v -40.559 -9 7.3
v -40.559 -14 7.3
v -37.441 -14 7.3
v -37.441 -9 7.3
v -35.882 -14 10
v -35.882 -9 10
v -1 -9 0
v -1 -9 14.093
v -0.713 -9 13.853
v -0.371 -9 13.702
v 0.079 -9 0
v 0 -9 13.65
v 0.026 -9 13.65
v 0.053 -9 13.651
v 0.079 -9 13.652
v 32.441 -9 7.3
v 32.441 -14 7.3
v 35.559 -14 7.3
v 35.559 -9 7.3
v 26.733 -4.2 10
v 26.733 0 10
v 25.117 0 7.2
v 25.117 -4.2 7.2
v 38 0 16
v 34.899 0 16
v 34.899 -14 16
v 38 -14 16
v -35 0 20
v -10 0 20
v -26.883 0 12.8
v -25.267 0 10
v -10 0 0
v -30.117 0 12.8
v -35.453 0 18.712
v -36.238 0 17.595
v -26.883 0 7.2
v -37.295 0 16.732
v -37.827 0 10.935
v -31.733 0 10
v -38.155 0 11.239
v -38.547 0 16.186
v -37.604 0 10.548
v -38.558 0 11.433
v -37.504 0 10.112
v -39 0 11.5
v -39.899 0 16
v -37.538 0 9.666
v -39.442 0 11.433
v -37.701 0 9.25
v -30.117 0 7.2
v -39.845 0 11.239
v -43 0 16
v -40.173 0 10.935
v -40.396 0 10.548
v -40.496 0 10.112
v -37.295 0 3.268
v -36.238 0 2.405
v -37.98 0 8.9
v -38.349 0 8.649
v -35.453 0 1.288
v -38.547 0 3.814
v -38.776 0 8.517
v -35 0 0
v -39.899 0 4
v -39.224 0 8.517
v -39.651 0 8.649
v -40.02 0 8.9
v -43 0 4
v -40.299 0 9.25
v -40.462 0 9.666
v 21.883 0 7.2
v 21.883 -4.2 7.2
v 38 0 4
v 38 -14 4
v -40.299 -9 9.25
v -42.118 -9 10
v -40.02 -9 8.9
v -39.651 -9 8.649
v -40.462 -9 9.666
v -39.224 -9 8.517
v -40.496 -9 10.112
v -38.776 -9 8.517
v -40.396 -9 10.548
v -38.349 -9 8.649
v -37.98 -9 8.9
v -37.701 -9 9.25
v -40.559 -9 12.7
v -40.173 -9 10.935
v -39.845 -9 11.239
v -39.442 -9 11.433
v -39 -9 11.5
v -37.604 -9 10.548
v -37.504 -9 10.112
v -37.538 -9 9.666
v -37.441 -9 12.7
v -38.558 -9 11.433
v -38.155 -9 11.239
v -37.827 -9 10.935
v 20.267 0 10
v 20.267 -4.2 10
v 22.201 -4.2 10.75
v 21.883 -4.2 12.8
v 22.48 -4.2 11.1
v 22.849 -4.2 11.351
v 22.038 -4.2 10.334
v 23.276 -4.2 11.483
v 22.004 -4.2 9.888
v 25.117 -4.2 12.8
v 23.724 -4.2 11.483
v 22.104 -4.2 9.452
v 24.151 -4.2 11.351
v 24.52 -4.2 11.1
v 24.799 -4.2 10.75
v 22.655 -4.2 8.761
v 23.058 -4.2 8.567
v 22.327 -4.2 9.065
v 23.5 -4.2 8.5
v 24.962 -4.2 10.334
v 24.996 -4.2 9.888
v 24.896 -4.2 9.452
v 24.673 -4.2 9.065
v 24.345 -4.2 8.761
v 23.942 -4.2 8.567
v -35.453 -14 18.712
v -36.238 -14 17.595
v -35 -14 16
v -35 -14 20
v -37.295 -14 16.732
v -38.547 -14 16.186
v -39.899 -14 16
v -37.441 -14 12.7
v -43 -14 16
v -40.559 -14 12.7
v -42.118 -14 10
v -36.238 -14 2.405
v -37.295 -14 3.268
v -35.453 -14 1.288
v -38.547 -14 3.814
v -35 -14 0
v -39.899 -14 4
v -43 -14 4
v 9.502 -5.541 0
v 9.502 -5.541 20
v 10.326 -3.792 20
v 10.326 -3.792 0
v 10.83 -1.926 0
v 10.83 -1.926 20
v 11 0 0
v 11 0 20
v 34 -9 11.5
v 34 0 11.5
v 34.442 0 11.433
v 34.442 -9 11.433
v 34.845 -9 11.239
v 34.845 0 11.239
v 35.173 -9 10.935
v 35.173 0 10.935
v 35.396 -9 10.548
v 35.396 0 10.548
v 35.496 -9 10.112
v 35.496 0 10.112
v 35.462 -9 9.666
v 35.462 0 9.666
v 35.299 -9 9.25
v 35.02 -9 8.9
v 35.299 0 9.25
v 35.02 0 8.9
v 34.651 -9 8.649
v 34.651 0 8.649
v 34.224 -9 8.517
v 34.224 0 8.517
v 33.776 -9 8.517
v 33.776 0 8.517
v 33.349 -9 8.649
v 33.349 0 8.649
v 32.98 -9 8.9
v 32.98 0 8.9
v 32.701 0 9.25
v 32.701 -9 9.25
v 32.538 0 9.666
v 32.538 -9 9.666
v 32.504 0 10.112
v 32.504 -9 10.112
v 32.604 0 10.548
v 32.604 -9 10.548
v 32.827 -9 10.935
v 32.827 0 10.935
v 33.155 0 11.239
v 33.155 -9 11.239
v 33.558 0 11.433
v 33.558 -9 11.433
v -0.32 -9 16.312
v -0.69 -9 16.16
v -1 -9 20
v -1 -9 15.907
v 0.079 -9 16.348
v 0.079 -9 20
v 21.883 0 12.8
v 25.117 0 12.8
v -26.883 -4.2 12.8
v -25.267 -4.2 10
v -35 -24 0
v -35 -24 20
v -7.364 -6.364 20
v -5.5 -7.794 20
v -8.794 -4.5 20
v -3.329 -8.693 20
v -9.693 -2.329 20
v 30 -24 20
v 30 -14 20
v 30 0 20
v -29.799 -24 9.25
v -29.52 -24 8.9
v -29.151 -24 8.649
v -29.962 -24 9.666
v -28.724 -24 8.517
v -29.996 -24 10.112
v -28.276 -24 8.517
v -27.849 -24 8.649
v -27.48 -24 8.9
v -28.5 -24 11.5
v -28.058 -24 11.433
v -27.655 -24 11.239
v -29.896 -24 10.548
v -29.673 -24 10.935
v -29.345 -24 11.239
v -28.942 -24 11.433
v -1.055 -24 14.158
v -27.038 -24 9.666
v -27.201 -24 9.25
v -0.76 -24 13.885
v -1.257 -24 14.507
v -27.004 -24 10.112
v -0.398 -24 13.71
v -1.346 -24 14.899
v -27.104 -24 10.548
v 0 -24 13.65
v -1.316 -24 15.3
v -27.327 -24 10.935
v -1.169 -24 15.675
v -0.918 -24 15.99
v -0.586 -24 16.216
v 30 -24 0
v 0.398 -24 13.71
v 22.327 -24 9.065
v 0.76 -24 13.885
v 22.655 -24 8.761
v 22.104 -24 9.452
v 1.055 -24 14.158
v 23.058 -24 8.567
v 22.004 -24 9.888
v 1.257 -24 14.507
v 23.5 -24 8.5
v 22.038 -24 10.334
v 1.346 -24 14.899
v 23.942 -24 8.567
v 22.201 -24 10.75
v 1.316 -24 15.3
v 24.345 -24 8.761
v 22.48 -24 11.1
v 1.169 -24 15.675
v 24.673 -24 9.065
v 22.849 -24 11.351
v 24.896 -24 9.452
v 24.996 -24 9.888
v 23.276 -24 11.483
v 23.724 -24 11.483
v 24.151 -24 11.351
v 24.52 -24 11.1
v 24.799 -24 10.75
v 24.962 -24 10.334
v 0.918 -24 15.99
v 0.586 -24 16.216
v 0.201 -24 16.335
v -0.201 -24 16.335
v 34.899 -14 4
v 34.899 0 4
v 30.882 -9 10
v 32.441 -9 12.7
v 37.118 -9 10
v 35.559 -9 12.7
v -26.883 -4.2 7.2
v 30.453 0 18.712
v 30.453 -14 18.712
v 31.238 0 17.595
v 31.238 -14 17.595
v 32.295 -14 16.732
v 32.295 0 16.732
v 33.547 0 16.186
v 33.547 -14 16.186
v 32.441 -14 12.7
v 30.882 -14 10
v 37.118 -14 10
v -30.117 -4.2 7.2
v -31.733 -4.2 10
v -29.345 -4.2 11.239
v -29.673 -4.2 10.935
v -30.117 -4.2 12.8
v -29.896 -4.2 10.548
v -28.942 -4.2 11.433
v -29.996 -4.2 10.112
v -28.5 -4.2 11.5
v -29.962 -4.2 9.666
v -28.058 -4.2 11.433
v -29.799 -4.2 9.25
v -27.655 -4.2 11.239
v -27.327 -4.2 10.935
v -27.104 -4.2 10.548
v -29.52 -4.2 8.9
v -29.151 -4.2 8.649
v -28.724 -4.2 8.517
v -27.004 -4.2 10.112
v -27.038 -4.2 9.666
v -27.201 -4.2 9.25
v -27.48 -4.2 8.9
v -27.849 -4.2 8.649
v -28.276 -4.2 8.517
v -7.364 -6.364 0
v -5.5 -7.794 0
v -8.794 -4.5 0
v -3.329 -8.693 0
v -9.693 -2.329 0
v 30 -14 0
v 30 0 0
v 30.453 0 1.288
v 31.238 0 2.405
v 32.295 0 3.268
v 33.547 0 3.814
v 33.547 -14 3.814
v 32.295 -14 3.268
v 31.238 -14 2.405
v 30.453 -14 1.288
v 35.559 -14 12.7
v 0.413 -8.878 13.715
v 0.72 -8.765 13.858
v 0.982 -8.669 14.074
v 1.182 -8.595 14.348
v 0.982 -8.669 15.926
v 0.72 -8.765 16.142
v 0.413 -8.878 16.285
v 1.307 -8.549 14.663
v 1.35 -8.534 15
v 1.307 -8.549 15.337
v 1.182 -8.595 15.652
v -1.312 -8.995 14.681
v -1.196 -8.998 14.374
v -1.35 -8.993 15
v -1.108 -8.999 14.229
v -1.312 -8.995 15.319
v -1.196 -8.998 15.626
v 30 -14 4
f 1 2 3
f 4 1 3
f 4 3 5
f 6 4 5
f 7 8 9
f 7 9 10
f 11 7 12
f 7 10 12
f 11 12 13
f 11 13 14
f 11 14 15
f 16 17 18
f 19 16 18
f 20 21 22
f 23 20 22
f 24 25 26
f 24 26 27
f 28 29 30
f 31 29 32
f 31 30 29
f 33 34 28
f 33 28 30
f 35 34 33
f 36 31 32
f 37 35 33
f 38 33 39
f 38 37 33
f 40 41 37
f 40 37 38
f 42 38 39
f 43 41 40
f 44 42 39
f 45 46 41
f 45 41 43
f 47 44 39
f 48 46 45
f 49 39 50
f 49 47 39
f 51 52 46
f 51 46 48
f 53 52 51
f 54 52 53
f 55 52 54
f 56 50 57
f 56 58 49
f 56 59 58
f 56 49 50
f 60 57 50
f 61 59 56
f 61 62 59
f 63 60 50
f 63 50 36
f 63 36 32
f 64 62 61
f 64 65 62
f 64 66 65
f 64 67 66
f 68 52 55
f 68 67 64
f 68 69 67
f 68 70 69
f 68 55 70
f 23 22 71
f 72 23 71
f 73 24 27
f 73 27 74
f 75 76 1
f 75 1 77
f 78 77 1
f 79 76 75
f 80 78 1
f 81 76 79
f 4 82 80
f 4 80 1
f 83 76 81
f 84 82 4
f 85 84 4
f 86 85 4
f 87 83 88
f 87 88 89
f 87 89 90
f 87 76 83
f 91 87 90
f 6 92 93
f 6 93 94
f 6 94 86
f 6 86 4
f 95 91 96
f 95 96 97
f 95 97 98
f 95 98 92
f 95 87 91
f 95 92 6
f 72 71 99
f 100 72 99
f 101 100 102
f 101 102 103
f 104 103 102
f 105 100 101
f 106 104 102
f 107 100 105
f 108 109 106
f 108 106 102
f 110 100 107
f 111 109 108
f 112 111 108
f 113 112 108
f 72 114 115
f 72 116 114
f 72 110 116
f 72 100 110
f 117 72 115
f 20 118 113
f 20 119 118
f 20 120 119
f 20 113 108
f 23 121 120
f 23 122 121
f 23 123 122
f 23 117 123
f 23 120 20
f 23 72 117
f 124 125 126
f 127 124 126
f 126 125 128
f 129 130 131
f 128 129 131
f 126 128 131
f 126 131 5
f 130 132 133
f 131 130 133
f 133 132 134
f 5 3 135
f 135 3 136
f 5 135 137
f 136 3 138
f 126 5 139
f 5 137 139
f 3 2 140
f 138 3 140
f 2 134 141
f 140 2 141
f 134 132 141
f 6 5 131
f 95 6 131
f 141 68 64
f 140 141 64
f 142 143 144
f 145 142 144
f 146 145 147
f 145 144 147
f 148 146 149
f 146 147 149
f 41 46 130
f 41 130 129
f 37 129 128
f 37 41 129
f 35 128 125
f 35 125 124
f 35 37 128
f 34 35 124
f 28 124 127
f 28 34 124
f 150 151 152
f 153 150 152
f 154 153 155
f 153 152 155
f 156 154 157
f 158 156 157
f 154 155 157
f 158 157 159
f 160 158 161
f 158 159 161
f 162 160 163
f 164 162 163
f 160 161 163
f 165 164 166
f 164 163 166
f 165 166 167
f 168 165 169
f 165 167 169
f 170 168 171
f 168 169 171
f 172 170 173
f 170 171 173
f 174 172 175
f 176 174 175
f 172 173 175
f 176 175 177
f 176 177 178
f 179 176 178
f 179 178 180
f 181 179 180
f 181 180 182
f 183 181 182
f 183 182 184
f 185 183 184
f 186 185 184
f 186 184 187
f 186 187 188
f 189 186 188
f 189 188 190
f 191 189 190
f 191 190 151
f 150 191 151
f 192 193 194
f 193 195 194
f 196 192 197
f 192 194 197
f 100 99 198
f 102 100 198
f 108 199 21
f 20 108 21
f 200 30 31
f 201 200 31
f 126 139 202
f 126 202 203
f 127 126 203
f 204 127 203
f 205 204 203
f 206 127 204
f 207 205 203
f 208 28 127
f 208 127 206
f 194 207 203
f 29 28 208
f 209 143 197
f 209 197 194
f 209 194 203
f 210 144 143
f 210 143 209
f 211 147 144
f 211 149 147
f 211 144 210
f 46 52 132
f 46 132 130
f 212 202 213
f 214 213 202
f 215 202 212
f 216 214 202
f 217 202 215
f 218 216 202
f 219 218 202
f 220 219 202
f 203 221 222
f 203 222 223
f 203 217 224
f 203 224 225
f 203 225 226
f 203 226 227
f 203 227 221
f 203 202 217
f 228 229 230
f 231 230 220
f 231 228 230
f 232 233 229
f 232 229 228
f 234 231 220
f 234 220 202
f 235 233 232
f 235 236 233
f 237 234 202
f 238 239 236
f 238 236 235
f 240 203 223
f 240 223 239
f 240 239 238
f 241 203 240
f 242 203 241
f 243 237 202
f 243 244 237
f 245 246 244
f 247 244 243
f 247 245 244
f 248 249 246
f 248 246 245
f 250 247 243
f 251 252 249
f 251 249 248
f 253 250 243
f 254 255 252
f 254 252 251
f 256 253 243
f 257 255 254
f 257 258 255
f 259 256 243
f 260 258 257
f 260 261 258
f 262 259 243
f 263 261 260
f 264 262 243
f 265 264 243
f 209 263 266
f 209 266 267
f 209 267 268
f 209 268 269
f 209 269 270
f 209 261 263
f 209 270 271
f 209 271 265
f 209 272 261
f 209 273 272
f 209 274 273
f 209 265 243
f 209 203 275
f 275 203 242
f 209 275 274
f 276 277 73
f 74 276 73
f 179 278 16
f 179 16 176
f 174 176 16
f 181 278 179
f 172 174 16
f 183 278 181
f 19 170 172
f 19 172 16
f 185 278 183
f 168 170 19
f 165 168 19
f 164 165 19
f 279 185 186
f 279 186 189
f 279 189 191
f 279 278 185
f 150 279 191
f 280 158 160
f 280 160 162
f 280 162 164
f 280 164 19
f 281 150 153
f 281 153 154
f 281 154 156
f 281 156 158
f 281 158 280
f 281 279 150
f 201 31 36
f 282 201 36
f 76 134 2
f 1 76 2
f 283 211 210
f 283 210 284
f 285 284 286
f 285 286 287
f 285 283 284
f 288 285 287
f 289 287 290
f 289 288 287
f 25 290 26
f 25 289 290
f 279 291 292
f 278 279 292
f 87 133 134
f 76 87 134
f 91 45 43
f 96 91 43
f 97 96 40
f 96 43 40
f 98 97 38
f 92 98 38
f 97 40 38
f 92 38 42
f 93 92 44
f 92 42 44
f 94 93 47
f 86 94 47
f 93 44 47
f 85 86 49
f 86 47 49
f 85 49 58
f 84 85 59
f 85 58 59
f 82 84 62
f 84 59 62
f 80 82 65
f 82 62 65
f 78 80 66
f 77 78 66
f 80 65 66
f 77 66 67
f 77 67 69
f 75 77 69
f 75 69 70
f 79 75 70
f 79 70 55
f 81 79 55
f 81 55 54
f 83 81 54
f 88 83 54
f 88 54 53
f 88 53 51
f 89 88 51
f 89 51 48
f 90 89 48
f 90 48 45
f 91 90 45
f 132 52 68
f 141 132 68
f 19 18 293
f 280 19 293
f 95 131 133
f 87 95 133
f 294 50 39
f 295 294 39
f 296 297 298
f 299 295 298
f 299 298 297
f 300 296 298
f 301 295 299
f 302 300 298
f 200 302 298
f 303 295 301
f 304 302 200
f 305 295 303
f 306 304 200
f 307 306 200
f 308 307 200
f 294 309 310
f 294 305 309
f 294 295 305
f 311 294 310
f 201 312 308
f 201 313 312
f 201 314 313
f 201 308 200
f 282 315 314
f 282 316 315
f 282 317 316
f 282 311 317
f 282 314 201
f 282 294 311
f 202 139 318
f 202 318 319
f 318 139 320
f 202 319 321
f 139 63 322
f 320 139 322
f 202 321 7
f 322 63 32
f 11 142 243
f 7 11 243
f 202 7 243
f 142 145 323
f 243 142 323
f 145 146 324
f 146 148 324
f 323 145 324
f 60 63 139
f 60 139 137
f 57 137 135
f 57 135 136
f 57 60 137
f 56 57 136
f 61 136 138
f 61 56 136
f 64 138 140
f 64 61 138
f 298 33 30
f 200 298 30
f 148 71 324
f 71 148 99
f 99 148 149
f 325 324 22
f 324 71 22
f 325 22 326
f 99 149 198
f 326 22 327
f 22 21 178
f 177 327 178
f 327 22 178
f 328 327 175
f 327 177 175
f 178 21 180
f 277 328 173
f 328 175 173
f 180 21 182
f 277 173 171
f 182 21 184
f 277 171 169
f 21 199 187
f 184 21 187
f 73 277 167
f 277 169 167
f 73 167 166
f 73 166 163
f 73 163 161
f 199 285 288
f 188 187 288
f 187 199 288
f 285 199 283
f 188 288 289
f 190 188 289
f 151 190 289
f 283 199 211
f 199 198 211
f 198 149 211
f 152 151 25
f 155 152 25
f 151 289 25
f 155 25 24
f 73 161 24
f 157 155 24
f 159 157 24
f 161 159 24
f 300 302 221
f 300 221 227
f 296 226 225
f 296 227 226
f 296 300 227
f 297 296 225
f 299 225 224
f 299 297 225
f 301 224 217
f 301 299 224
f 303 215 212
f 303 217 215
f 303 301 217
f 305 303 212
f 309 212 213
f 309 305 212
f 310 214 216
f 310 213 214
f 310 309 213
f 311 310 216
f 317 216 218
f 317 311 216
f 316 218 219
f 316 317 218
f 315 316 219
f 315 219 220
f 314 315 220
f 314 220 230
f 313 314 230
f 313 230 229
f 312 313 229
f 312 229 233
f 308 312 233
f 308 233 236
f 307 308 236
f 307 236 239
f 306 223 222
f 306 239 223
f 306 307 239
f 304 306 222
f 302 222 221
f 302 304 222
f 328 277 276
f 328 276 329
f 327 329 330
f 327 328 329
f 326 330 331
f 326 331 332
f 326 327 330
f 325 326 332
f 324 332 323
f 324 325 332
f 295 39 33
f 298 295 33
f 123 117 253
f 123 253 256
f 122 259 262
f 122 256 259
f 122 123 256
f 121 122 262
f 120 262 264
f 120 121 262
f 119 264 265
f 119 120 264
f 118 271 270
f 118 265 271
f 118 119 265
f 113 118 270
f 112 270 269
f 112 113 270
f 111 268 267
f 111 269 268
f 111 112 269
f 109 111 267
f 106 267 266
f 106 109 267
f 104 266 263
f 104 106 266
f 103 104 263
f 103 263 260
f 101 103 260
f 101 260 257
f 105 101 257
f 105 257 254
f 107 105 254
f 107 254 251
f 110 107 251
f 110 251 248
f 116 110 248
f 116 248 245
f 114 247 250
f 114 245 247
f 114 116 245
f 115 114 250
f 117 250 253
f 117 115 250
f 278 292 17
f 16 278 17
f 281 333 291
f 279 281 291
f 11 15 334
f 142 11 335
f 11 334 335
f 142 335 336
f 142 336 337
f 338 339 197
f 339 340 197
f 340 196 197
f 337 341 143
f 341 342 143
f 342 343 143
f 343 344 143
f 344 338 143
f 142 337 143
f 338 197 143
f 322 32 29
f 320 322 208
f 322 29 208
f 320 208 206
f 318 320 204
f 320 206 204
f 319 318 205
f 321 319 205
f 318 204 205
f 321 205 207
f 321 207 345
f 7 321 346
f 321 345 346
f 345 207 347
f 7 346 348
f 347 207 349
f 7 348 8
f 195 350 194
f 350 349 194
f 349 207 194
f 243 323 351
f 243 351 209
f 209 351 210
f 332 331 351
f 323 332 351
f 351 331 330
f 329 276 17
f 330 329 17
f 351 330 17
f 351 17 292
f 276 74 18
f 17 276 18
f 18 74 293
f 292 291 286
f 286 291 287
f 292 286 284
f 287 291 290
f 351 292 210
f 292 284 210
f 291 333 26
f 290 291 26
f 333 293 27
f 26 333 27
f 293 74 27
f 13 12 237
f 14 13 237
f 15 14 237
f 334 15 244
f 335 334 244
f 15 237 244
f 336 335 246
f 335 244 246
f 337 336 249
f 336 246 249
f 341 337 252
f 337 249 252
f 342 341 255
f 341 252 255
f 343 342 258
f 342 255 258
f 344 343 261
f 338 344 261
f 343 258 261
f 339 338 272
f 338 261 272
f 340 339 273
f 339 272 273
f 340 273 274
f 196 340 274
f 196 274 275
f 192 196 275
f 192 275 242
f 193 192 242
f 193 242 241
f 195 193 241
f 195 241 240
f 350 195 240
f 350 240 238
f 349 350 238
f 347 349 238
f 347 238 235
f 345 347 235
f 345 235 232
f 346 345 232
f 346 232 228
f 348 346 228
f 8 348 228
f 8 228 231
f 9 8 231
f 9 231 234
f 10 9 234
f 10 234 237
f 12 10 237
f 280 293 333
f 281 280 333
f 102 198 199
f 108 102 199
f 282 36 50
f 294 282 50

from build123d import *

# Parameters (mm, degrees)
SKETCH_1_W           = 60
SKETCH_1_H           = 34
EXTRUDE_1_DEPTH      = 20
CUT_EXTRUDE_8_DEPTH  = 66
SKETCH_20_W          = 5
SKETCH_20_H          = 34
EXTRUDE_7_DEPTH      = 20
SKETCH_22_W          = 65
SKETCH_22_H          = 20
EXTRUDE_8_DEPTH      = 7
SKETCH_21_R          = 1.5
CUT_EXTRUDE_13_DEPTH = 58.497826046
CUT_EXTRUDE_START    = -41
SKETCH_23_W          = 65
SKETCH_23_H          = 20
CUT_EXTRUDE_14_DEPTH = 17
CUT_EXTRUDE_16_DEPTH = 4.2
SKETCH_27_W          = 8
SKETCH_27_H          = 12
EXTRUDE_10_DEPTH     = 14
SKETCH_30_R          = 1.5
CUT_EXTRUDE_18_DEPTH = 54.150729064
FILLET_6_R           = 5
CUT_EXTRUDE_22_DEPTH = 5
SKETCH_36_R          = 1.35
CUT_EXTRUDE_23_DEPTH = 54.150729064


with BuildPart() as part:
    # 草图1 → 凸台-拉伸1 (new body)
    with BuildSketch(Plane.XY):
        Rectangle(SKETCH_1_W, SKETCH_1_H)
    extrude(amount=EXTRUDE_1_DEPTH)

    # 草图19 → 切除-拉伸8 (cut)
    with BuildSketch(Plane.XY.offset(20)):
        with BuildLine():
            Line((0, 9), (-1, 9))
            ThreePointArc((-1, 9), (-10, 0), (-1, -9))
            Line((-1, -9), (0.07899986, -9))
            Line((0.07899986, -9), (9.502211487, -5.541477859))
            ThreePointArc((9.502211487, -5.541477859), (11, 0), (9.502211487, 5.541477859))
            Line((9.502211487, 5.541477859), (0, 9))
        make_face()
    extrude(amount=-CUT_EXTRUDE_8_DEPTH, mode=Mode.SUBTRACT)

    # 草图20 → 凸台-拉伸7 (add)
    with BuildSketch(Plane.XY.offset(20)):
        with Locations((-32.5, 0)):
            Rectangle(SKETCH_20_W, SKETCH_20_H)
    extrude(amount=-EXTRUDE_7_DEPTH)

    # 草图22 → 凸台-拉伸8 (add)
    with BuildSketch(Plane.XZ.offset(17)):
        with Locations((-2.5, 10)):
            Rectangle(SKETCH_22_W, SKETCH_22_H)
    extrude(amount=EXTRUDE_8_DEPTH)

    # 草图21 → 切除-拉伸13 (cut, through all)
    with BuildSketch(Plane.XZ.offset(-17)):
        with Locations(Location((-28.5, 10, 0), (0, 0, 90))):
            Circle(SKETCH_21_R)
        with Locations(Location((23.5, 10, 0), (0, 0, 270))):
            Circle(SKETCH_21_R)
    extrude(amount=CUT_EXTRUDE_13_DEPTH, mode=Mode.SUBTRACT)

    # 草图23 → 切除-拉伸14 (cut)
    with BuildSketch(Plane.XZ.offset(24).offset(CUT_EXTRUDE_START)):
        with Locations((-2.5, 10)):
            Rectangle(SKETCH_23_W, SKETCH_23_H)
    extrude(amount=CUT_EXTRUDE_14_DEPTH, mode=Mode.SUBTRACT)

    # 草图25 → 切除-拉伸16 (cut)
    with BuildSketch(Plane(origin=(0, 0, 0), x_dir=(1, 0, 0), z_dir=(0, 1, 0))):
        Polygon((26.733161507, -10), (25.116580754, -7.2), (21.883419246, -7.2), (20.266838493, -10), (21.883419246, -12.8), (25.116580754, -12.8), align=None)
        Polygon((-25.266838493, -10), (-26.883419246, -7.2), (-30.116580754, -7.2), (-31.733161507, -10), (-30.116580754, -12.8), (-26.883419246, -12.8), align=None)
    extrude(amount=-CUT_EXTRUDE_16_DEPTH, mode=Mode.SUBTRACT)

    # 草图27 → 凸台-拉伸10 (add)
    with BuildSketch(Plane(origin=(0, 0, 0), x_dir=(1, 0, 0), z_dir=(0, 1, 0))):
        with Locations((34, -10)):
            Rectangle(SKETCH_27_W, SKETCH_27_H)
        with Locations((-39, -10)):
            Rectangle(SKETCH_27_W, SKETCH_27_H)
    extrude(amount=-EXTRUDE_10_DEPTH)

    # 草图30 → 切除-拉伸18 (cut, through all)
    with BuildSketch(Plane(origin=(0, 0, 0), x_dir=(1, 0, 0), z_dir=(0, 1, 0))):
        with Locations(Location((34, -10, 0), (0, 0, 270))):
            Circle(SKETCH_30_R)
        with Locations(Location((-39, -10, 0), (0, 0, 270))):
            Circle(SKETCH_30_R)
    extrude(amount=-CUT_EXTRUDE_18_DEPTH, mode=Mode.SUBTRACT)

    # 圆角6
    # the kernel refuses this fillet: 5 mm, written as the material it adds along each edge
    with BuildSketch(Plane(origin=(-35, 0, 4), x_dir=(-1.5685230891899147e-12, 0, -1.0), z_dir=(0, -1, 0)), Plane(origin=(30, 0, 16), x_dir=(1.5978329770400045e-12, 0, 1.0), z_dir=(0, -1, 0))) as fillet_6_piece_1:
        with BuildLine():
            CenterArc((5, -4.898979486), FILLET_6_R, 101.536959033, 78.463040967)
            Line((0, -4.898979486), (-0.1, -4.898979486))
            Line((-0.1, -4.898979486), (-0.1, 0))
            Line((-0.1, 0), (0, 0.1))
            ThreePointArc((0, 0.1), (2, 0.1), (3.98, 0.09797959))
            Line((3.98, 0.09797959), (4, 0))
        make_face()
    extrude(amount=14)
    with BuildSketch(Plane(origin=(-35, 0, 16), x_dir=(-1.596944798620306e-12, 0, 1.0), z_dir=(0, -1, 0)), Plane(origin=(30, 0, 4), x_dir=(1.5702994460293186e-12, 0, -1.0), z_dir=(0, -1, 0))) as fillet_6_piece_2:
        with BuildLine():
            CenterArc((5, 4.898979486), FILLET_6_R, 180, 78.463040967)
            Line((0, 4.898979486), (-0.1, 4.898979486))
            Line((-0.1, 4.898979486), (-0.1, 0))
            Line((-0.1, 0), (0, -0.1))
            ThreePointArc((0, -0.1), (2, -0.1), (3.98, -0.09797959))
            Line((3.98, -0.09797959), (4, 0))
        make_face()
    extrude(amount=14)

    # 草图35 → 切除-拉伸22 (cut)
    with BuildSketch(Plane.XZ.offset(14)):
        Polygon((37.117691454, 10), (35.558845727, 12.7), (32.441154273, 12.7), (30.882308546, 10), (32.441154273, 7.3), (35.558845727, 7.3), align=None)
        Polygon((-35.882308546, 10), (-37.441154273, 12.7), (-40.558845727, 12.7), (-42.117691454, 10), (-40.558845727, 7.3), (-37.441154273, 7.3), align=None)
    extrude(amount=-CUT_EXTRUDE_22_DEPTH, mode=Mode.SUBTRACT)

    # 草图36 → 切除-拉伸23 (cut, through all)
    with BuildSketch(Plane.XZ.offset(24)):
        with Locations(Location((0, 15, 0), (0, 0, 270))):
            Circle(SKETCH_36_R)
    extrude(amount=-CUT_EXTRUDE_23_DEPTH, mode=Mode.SUBTRACT)


solid = part.part
